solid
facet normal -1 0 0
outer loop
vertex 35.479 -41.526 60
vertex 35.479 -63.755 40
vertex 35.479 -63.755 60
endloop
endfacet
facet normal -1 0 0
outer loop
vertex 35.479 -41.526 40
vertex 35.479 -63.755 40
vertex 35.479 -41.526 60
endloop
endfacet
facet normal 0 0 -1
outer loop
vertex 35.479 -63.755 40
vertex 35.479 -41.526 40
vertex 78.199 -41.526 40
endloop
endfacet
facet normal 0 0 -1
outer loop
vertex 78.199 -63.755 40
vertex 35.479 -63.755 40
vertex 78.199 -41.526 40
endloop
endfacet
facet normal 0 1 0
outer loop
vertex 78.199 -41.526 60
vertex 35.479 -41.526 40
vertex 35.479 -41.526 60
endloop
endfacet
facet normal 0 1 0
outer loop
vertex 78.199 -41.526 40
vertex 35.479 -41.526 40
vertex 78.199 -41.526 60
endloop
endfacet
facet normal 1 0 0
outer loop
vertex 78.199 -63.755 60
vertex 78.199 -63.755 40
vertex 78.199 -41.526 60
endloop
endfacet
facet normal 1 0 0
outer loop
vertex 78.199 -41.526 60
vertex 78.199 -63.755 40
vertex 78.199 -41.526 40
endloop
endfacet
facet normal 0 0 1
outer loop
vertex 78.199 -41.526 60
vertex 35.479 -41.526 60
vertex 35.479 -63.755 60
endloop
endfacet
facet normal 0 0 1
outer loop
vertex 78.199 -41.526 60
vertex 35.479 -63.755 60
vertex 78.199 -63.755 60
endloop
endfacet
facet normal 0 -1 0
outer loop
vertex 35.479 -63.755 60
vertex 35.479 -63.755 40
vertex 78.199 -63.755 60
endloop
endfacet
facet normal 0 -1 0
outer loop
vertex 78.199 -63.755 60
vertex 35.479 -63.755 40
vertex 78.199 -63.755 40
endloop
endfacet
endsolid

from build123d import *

# Parameters (mm, degrees)
ESBO_O1_W                  = 156.39786889
ESBO_O1_H                  = 127.51
NOVO_DEPTH                 = 40
ESBO_O2_W                  = 24.691065998
ESBO_O2_H                  = 20
RESSALTO_EXTRUS_O2_DEPTH   = 20
RESSALTO_EXTRUS_O2_2_DEPTH = 20
ESBO_O2_W_2                = 42.720162864
ESBO_O2_H_2                = 22.228889681
RESSALTO_EXTRUS_O2_3_DEPTH = 20
RESSALTO_EXTRUS_O2_4_DEPTH = 20


with BuildPart() as part:
    # Esboço1 → Novo (new body)
    with BuildSketch(Plane.XY):
        Rectangle(ESBO_O1_W, ESBO_O1_H)
    extrude(amount=NOVO_DEPTH)


with BuildPart() as body_2:
    # Esboço2 → Ressalto-extrusão2 (new body)
    with BuildSketch(Plane.XY.offset(40)):
        with Locations((-65.853401446, -53.755)):
            Rectangle(ESBO_O2_W, ESBO_O2_H)
    extrude(amount=RESSALTO_EXTRUS_O2_DEPTH)


with BuildPart() as body_3:
    # Esboço2 → Ressalto-extrus_o2 2 (new body)
    with BuildSketch(Plane.XY.offset(40)):
        with Locations((-65.853401446, 53.755)):
            Rectangle(ESBO_O2_W, ESBO_O2_H)
    extrude(amount=RESSALTO_EXTRUS_O2_2_DEPTH)


with BuildPart() as body_4:
    # Esboço2 → Ressalto-extrus_o2 3 (new body)
    with BuildSketch(Plane.XY.offset(40)):
        with Locations((56.838853013, 52.64055516)):
            Rectangle(ESBO_O2_W_2, ESBO_O2_H_2)
    extrude(amount=RESSALTO_EXTRUS_O2_3_DEPTH)


with BuildPart() as body_5:
    # Esboço2 → Ressalto-extrus_o2 4 (new body)
    with BuildSketch(Plane.XY.offset(40)):
        with Locations((56.838853013, -52.64055516)):
            Rectangle(ESBO_O2_W_2, ESBO_O2_H_2)
    extrude(amount=RESSALTO_EXTRUS_O2_4_DEPTH)


solid = body_5.part
